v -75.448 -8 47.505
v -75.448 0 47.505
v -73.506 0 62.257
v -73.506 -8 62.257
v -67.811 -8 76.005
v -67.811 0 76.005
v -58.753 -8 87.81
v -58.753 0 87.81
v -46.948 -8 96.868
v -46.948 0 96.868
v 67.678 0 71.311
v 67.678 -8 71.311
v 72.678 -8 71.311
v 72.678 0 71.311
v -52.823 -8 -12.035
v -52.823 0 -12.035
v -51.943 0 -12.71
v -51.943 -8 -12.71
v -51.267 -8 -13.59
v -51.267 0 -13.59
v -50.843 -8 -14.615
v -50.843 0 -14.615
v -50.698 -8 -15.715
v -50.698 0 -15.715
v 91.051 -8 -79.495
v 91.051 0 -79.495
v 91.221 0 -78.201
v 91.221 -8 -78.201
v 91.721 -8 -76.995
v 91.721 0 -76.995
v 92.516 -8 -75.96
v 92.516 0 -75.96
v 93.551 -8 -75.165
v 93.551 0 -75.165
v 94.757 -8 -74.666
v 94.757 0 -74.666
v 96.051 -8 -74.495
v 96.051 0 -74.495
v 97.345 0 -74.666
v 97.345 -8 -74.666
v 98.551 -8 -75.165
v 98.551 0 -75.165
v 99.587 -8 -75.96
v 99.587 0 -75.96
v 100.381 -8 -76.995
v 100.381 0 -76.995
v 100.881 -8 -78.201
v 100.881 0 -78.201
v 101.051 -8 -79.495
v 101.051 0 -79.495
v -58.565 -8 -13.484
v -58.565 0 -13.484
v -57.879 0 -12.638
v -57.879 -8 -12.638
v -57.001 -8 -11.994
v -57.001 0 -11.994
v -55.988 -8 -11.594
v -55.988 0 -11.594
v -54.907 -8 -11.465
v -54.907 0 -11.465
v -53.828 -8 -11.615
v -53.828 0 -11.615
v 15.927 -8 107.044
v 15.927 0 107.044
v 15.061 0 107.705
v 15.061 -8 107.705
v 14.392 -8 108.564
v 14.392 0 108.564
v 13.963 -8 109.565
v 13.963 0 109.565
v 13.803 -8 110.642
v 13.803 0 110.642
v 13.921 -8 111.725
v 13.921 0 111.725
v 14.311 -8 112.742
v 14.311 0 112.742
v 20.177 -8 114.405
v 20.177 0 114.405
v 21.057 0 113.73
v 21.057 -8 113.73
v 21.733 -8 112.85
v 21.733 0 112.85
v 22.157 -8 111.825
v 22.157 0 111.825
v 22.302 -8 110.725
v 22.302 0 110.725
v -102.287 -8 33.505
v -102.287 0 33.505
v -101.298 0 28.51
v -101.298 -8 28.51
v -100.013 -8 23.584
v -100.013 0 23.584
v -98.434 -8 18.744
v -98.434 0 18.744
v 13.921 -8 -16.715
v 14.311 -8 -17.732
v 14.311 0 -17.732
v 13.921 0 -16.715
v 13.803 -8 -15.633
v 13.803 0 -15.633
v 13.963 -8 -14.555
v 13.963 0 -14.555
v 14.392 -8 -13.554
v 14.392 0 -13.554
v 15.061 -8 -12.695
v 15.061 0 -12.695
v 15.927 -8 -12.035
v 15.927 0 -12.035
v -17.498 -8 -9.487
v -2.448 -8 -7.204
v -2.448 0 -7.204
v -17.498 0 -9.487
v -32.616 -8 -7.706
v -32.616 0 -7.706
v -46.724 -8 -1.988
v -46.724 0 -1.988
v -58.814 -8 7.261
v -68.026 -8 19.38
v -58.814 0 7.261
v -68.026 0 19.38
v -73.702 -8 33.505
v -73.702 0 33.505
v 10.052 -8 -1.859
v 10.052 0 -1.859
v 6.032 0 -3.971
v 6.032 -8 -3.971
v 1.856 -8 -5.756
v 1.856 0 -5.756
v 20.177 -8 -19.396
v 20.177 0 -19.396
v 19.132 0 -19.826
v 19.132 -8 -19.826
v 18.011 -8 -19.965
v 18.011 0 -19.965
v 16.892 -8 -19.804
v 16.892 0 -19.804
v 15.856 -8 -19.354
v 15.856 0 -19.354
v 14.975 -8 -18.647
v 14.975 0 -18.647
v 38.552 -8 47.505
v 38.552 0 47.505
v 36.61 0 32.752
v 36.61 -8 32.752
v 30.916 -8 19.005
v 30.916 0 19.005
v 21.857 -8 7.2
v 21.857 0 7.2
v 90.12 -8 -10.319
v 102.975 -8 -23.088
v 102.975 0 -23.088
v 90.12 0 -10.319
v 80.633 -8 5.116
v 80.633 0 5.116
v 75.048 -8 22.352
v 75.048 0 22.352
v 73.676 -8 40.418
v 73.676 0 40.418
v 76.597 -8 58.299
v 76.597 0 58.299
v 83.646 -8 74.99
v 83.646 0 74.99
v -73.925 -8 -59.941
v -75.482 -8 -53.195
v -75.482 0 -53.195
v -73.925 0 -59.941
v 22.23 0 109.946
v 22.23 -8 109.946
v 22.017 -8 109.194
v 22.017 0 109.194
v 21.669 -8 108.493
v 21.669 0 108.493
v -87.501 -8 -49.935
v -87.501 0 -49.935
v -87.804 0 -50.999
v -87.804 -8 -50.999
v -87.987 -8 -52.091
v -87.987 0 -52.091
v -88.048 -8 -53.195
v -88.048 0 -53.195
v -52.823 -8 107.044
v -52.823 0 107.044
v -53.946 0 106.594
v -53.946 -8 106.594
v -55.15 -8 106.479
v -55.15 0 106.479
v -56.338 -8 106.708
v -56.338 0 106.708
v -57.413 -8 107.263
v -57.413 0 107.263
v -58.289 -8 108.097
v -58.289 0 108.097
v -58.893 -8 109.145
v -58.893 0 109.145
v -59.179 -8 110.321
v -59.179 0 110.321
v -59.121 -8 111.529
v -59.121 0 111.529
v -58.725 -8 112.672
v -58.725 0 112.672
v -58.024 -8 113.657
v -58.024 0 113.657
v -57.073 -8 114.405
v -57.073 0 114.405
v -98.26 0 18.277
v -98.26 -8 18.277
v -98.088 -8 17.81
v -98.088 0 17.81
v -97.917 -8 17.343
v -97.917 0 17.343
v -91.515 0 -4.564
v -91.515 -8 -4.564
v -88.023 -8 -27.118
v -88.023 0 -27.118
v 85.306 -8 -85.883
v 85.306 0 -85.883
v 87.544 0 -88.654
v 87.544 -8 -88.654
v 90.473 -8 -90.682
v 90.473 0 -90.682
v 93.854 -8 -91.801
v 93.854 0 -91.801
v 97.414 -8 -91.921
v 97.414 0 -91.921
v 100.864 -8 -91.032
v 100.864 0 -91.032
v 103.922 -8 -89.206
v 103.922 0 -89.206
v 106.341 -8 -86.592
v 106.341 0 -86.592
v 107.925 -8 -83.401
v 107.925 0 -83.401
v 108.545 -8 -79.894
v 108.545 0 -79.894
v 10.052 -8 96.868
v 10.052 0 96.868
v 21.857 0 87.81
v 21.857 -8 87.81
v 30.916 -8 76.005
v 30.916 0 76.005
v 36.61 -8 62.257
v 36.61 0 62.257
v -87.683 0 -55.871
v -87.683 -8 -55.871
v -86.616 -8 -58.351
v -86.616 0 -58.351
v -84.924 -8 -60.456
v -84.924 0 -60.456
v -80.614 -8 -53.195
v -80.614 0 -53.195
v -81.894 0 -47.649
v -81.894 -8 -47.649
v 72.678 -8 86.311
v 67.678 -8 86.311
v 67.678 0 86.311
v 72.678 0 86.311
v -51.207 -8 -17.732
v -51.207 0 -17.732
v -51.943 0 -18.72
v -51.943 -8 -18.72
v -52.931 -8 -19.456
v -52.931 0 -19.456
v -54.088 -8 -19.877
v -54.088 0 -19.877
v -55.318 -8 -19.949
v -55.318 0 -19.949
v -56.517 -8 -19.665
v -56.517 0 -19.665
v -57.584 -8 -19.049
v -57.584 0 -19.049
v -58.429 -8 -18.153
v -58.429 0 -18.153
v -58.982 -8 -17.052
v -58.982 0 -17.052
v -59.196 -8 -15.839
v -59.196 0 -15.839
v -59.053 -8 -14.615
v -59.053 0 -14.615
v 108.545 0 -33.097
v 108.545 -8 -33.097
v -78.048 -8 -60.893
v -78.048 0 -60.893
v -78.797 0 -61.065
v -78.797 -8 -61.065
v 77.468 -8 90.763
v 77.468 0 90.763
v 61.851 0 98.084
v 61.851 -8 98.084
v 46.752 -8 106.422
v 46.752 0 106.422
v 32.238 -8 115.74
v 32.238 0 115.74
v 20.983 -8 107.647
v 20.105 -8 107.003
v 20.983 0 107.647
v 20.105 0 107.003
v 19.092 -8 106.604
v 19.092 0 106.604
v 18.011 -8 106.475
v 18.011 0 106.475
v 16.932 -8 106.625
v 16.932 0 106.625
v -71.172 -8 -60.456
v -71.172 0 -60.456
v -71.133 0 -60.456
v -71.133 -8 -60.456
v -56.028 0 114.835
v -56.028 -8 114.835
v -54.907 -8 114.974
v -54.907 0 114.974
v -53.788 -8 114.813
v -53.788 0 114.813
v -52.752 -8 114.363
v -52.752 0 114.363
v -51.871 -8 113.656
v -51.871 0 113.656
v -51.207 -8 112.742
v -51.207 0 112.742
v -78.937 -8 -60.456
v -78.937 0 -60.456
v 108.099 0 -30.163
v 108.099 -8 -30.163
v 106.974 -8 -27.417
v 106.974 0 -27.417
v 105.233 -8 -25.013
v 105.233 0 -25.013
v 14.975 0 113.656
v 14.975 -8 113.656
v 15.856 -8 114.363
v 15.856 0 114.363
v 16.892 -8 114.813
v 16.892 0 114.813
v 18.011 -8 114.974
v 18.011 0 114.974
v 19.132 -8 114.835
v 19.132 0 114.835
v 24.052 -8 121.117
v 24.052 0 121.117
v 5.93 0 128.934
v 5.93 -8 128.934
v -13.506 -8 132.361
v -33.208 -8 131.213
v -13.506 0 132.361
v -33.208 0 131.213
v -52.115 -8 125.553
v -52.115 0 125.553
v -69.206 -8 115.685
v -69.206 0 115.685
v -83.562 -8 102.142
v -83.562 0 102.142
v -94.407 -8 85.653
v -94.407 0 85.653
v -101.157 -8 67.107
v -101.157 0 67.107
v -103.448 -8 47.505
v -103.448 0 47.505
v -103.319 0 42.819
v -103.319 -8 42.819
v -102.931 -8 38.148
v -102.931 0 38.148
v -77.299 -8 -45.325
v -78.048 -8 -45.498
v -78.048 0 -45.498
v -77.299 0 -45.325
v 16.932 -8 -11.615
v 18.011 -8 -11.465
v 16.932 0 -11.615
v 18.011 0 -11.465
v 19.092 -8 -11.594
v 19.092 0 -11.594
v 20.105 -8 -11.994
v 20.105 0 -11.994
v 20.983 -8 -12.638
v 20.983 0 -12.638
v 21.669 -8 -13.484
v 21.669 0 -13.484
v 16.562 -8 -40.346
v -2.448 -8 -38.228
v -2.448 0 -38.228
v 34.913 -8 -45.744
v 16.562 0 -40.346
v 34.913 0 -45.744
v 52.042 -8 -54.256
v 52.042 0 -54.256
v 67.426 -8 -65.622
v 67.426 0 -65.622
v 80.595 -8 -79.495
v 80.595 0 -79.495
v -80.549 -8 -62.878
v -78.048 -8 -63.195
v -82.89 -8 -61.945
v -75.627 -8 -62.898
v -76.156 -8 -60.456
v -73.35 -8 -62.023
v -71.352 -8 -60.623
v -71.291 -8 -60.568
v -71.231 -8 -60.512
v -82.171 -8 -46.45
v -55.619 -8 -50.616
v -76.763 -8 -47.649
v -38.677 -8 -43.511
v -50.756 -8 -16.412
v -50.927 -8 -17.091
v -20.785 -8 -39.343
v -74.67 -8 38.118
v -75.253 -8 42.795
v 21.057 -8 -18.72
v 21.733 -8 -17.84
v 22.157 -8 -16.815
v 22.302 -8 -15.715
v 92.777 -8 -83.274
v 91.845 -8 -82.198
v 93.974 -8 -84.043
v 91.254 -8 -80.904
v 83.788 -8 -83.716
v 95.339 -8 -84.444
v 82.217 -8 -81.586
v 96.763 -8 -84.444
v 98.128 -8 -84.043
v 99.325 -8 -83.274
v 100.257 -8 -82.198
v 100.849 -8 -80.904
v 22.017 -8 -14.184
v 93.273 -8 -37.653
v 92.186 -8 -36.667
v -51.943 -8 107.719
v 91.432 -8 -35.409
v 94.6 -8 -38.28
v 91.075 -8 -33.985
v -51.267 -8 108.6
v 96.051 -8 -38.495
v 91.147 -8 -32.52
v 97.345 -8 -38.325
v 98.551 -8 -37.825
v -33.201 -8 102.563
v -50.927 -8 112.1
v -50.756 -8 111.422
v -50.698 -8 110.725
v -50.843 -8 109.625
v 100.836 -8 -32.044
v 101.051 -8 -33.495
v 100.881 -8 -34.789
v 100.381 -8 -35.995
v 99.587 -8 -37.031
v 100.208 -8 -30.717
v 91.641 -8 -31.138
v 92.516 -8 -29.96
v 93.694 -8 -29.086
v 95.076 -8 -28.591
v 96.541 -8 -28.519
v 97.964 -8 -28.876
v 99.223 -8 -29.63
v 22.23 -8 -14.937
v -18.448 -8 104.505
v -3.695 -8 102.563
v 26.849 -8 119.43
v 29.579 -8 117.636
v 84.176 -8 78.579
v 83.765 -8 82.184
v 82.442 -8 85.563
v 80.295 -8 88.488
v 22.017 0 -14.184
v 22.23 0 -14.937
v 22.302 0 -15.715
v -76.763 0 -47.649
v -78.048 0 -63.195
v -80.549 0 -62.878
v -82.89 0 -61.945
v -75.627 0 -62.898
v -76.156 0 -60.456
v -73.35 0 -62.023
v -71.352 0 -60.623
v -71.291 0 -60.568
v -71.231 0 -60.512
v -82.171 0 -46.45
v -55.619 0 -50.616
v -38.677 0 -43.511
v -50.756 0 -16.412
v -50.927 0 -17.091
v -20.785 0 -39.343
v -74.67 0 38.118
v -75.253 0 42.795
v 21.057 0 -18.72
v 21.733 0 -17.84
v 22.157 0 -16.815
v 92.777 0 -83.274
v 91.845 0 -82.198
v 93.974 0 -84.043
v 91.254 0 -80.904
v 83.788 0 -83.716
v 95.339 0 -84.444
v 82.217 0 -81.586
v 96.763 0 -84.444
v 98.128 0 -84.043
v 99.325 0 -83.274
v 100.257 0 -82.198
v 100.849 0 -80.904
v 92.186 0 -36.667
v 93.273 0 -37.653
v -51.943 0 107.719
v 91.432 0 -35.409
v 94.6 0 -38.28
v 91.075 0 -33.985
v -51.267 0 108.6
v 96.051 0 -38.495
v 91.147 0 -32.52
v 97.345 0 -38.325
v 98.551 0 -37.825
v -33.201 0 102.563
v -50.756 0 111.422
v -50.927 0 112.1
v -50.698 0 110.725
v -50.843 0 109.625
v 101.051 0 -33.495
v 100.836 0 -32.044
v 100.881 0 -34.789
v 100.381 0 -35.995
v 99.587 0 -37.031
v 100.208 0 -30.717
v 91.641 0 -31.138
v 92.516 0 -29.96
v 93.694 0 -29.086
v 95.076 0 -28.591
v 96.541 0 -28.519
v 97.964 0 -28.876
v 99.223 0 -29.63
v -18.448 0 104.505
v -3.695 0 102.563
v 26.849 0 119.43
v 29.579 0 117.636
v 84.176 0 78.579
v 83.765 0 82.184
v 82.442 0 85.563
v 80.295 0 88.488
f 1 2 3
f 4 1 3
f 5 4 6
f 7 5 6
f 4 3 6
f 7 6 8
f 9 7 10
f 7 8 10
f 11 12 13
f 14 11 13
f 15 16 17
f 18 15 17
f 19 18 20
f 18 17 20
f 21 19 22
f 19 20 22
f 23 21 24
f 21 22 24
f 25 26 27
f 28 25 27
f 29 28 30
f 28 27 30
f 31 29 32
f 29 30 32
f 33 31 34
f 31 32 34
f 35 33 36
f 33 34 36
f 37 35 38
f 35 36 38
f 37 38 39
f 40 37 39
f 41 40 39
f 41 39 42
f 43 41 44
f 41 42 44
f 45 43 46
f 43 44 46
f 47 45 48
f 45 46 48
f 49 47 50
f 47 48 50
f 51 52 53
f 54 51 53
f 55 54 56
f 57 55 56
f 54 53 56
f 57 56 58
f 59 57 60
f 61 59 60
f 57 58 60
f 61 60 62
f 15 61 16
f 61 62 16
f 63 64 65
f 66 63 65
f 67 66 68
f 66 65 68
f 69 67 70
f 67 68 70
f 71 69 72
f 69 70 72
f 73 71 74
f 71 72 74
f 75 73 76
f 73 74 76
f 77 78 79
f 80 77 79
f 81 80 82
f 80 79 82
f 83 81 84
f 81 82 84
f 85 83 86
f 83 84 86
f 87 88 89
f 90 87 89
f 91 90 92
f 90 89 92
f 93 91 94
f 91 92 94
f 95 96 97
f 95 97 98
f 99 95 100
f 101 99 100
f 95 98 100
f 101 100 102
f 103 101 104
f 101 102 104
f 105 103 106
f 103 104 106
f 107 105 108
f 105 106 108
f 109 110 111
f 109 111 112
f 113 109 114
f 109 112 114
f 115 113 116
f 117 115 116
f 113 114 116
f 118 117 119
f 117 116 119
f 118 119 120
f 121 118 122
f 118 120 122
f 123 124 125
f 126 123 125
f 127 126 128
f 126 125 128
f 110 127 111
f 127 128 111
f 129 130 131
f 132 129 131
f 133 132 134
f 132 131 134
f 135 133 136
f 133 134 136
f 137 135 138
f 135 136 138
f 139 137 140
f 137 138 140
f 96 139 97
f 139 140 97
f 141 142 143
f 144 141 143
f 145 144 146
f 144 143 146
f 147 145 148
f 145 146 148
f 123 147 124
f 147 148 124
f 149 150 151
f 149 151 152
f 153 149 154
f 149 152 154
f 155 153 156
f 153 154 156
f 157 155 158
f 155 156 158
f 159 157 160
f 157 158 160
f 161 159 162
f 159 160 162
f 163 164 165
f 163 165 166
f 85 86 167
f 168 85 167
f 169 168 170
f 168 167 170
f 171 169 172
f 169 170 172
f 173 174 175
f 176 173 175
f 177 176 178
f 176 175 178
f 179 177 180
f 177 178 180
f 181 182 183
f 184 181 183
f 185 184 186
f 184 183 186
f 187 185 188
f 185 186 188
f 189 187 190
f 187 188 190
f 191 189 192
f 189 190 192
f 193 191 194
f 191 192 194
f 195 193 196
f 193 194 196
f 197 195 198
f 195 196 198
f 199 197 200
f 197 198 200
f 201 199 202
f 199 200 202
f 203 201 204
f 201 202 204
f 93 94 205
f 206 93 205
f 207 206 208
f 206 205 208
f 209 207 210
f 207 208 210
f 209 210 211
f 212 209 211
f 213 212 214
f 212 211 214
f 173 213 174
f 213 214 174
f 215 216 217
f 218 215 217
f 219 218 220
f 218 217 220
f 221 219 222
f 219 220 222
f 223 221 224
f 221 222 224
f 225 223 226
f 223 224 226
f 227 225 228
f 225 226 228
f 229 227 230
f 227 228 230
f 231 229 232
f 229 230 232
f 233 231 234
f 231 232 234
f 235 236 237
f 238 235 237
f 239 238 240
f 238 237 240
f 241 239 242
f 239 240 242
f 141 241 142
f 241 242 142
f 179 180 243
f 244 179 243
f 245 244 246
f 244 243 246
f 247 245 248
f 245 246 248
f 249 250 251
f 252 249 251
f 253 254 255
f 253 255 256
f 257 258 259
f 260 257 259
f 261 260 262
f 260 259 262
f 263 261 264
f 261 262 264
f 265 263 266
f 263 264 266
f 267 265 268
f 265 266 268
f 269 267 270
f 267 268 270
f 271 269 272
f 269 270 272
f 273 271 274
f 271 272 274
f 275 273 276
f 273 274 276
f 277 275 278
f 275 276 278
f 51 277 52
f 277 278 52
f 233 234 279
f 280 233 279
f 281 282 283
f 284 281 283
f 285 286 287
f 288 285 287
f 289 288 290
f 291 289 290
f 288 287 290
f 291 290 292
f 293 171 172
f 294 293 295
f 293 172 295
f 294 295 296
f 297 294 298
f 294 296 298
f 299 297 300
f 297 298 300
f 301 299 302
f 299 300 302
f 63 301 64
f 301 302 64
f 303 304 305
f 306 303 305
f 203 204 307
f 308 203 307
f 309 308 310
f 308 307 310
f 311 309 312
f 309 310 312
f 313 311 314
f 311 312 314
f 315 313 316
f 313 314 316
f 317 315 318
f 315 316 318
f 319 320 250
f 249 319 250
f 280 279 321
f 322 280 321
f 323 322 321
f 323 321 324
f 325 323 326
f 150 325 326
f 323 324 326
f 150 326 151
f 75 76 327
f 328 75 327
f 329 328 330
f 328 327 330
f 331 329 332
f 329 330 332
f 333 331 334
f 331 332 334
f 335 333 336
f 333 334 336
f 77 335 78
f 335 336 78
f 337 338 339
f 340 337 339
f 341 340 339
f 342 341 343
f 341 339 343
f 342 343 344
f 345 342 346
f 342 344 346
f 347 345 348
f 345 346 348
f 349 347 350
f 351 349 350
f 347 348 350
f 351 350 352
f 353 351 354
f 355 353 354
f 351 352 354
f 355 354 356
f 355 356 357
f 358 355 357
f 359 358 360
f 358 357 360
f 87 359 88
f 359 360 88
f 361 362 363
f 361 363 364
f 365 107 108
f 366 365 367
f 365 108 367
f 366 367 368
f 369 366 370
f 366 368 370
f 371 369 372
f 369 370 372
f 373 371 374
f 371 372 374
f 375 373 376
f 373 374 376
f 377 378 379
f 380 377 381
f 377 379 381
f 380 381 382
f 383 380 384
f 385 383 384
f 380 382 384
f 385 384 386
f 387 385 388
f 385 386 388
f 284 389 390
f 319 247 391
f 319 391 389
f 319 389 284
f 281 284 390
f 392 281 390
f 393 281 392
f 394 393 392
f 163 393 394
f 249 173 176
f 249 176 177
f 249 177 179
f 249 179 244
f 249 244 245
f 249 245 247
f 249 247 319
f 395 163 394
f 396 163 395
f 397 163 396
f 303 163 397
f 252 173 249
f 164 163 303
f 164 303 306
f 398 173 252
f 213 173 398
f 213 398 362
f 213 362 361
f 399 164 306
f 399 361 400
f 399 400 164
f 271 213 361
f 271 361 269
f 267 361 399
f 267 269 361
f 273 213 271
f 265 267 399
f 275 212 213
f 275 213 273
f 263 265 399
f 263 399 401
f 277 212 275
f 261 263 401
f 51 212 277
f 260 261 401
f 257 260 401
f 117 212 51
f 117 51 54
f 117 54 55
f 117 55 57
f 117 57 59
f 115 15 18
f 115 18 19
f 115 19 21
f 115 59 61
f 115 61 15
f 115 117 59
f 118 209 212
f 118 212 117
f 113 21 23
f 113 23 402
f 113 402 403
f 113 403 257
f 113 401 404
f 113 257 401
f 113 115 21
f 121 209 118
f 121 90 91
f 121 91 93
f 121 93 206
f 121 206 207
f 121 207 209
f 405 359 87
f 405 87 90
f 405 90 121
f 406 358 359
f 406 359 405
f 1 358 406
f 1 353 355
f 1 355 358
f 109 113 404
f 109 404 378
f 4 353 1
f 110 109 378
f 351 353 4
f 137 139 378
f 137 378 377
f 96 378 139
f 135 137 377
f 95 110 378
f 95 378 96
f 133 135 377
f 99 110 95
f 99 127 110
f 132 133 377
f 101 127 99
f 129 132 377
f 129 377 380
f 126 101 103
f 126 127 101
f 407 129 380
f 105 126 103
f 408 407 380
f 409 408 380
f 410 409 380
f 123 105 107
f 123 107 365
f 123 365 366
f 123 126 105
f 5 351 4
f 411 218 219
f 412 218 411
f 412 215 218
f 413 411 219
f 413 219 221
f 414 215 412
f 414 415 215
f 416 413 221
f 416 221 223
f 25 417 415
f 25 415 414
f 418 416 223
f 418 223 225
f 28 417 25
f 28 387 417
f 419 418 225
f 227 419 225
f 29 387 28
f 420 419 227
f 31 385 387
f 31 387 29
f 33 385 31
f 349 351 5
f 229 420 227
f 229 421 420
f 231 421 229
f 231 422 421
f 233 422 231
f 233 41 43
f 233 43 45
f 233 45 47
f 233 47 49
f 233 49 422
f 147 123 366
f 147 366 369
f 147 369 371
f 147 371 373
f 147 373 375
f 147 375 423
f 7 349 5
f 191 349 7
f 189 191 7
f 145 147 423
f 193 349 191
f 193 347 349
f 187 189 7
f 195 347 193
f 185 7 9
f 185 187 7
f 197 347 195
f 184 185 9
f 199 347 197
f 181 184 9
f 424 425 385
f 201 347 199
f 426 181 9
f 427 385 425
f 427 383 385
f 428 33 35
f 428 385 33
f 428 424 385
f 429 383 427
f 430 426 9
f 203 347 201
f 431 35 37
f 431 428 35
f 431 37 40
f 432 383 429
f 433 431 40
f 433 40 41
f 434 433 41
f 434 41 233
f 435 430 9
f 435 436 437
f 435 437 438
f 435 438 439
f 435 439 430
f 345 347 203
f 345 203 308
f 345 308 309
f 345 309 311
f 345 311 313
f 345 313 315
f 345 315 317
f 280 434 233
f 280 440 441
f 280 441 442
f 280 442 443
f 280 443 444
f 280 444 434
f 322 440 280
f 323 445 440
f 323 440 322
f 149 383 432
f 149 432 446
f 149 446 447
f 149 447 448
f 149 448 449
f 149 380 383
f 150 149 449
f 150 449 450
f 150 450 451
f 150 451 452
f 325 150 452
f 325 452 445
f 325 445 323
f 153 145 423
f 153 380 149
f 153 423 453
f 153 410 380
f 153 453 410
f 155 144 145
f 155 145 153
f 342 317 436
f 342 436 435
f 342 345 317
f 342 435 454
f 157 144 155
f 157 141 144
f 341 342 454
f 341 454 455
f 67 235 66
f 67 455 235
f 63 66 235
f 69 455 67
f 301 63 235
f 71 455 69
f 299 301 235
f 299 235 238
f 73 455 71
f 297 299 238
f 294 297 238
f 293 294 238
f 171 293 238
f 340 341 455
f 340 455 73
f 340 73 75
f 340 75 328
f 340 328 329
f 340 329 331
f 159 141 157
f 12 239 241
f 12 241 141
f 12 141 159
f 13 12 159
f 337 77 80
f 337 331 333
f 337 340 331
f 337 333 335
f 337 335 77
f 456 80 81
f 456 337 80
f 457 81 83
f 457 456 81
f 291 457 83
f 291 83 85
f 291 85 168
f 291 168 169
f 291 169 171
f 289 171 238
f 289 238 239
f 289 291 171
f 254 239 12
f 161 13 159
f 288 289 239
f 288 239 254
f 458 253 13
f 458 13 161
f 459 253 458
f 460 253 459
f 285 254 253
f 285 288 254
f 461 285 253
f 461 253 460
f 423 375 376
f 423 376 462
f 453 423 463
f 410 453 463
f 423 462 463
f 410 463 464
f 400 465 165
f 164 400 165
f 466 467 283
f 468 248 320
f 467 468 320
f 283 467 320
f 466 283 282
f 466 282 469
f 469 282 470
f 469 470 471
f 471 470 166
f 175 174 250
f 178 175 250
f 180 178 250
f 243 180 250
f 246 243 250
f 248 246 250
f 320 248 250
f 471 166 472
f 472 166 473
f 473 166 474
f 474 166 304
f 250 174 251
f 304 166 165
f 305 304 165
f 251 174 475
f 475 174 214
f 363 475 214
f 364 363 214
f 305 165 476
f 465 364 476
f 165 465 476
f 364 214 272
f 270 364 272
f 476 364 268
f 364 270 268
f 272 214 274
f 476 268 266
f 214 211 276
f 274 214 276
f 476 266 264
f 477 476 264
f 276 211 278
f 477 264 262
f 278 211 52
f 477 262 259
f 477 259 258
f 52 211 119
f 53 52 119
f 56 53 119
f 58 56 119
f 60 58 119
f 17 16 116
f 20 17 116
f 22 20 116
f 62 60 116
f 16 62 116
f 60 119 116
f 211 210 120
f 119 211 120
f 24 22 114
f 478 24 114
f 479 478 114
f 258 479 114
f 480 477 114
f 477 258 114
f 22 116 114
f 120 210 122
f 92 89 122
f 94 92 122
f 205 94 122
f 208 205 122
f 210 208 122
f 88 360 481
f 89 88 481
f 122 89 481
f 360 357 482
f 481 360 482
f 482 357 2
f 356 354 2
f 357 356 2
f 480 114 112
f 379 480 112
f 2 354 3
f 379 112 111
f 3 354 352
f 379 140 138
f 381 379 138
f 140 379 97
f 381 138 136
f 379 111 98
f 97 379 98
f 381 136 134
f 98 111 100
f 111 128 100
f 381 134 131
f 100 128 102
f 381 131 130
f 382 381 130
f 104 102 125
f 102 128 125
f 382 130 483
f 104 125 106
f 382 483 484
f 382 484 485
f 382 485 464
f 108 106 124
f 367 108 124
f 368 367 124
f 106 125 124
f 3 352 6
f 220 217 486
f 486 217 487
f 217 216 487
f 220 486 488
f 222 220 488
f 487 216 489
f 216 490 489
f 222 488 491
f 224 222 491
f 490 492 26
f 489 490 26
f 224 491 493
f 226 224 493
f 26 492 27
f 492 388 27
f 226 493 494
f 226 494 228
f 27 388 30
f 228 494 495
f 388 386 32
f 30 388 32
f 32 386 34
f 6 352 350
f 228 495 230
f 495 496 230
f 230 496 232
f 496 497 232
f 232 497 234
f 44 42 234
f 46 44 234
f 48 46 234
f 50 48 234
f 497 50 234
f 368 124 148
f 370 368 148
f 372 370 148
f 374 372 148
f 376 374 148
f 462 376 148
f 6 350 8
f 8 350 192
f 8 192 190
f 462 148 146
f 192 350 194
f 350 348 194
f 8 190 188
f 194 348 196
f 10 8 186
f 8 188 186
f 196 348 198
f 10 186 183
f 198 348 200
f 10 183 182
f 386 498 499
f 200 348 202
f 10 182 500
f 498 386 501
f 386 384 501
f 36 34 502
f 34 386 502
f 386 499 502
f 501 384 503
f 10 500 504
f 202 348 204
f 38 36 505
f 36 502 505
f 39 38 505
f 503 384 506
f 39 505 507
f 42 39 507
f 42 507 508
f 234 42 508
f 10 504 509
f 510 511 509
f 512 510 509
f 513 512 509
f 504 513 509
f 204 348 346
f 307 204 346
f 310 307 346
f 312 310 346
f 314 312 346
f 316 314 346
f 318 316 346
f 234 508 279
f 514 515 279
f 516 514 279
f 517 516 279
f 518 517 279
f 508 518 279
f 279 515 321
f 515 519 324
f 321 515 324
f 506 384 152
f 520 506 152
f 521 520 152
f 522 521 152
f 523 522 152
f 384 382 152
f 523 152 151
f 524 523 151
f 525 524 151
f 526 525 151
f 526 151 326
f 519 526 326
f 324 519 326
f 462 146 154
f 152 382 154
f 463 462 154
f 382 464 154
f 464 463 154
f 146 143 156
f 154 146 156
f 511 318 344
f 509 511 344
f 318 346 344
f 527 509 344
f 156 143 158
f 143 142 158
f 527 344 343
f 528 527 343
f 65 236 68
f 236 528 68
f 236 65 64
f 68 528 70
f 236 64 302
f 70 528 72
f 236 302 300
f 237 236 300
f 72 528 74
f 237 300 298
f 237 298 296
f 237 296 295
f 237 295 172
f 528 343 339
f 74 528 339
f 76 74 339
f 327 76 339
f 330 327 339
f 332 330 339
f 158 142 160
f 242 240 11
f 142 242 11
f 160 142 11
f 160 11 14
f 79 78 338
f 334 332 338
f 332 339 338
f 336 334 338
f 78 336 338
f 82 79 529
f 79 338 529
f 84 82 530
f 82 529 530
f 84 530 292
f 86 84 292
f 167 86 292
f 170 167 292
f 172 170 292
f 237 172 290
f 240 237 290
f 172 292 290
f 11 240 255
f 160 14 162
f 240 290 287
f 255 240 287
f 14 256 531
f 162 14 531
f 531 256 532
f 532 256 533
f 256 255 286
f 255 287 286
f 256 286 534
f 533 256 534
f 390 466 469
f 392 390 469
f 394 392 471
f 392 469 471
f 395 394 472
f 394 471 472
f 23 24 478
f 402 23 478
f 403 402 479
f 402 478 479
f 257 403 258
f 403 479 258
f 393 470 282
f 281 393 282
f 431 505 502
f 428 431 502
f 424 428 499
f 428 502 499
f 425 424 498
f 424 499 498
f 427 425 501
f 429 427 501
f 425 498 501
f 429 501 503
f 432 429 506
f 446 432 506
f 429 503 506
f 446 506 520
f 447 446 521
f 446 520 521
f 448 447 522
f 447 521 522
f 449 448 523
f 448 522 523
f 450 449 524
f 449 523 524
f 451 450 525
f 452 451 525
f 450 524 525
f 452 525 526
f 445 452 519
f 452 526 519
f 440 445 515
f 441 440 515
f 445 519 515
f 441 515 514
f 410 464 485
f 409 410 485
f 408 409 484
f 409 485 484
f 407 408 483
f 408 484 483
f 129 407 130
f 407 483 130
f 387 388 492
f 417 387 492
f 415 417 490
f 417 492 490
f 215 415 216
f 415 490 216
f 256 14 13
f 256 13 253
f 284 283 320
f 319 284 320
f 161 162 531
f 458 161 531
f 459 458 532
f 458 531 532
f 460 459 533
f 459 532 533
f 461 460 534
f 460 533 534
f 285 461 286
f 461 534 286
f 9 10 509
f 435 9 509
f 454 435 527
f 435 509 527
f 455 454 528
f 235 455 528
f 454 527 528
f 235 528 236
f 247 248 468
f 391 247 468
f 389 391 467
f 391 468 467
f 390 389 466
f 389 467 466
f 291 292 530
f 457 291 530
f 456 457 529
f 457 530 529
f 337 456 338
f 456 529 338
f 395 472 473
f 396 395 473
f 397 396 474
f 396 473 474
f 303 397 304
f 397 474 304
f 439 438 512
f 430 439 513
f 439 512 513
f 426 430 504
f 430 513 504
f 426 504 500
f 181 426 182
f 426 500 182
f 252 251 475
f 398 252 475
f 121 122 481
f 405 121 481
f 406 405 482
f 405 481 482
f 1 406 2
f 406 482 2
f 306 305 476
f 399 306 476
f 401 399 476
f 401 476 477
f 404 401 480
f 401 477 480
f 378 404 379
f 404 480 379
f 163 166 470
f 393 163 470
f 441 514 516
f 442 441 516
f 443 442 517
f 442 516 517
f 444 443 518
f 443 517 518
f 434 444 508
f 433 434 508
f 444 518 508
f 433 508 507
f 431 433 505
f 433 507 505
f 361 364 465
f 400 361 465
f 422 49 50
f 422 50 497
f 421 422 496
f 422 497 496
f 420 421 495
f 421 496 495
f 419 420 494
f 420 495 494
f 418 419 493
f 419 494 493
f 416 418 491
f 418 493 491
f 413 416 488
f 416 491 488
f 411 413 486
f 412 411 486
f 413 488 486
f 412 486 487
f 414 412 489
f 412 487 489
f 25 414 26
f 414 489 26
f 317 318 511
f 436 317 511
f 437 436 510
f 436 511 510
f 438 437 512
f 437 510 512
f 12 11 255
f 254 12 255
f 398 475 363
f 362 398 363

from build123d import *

# Parameters (mm, degrees)
F0_W     = 5
F0_H     = 15
F1_DEPTH = 8


with BuildPart() as f1:
    # F0 (on Front) → F1 (new body)
    with BuildSketch(Plane.XZ):
        with BuildLine():
            ThreePointArc((96.051040545, -74.4952633909), (99.586574451, -75.9597294849), (101.051040545, -79.4952633909))
            Line((101.051040545, -79.4952633909), (108.5446846503, -79.4952633909))
            Line((108.5446846503, -79.4952633909), (108.5446846503, -79.0966947381))
            Line((108.5446846503, -79.0966947381), (108.5446846503, -33.8938320436))
            Line((108.5446846503, -33.8938320436), (108.5446846503, -33.0966947381))
            ThreePointArc((108.5446846503, -33.0966947381), (106.9735378091, -27.4166900782), (102.9745588744, -23.0878192309))
            ThreePointArc((102.9745588744, -23.0878192309), (75.0475031004, 22.3518348869), (83.6459918624, 74.9897356957))
            ThreePointArc((83.6459918624, 74.9897356957), (83.213349074, 83.916829816), (77.4679593625, 90.763046748))
            ThreePointArc((77.4679593625, 90.763046748), (54.2323791008, 102.1278384031), (32.237536797, 115.739509553))
            ThreePointArc((32.237536797, 115.739509553), (46.3985337021, 102.4586914011), (57.1766192186, 86.3110340872))
            ThreePointArc((57.1766192186, 86.3110340872), (64.1749741493, 67.4661239993), (66.5520777255, 47.5047366091))
            ThreePointArc((66.5520777255, 47.5047366091), (55.1642370471, 5.0047366091), (24.0520777255, -26.1074227125))
            ThreePointArc((24.0520777255, -26.1074227125), (11.2153330726, -32.151344654), (-2.4479222745, -35.9758000446))
            Line((-2.4479222745, -35.9758000446), (-2.4479222745, -38.2282986652))
            ThreePointArc((-2.4479222745, -38.2282986652), (43.6638893075, -49.6244865639), (80.5950273587, -79.4952633909))
            Line((80.5950273587, -79.4952633909), (91.051040545, -79.4952633909))
            ThreePointArc((91.051040545, -79.4952633909), (92.5155066391, -75.9597294849), (96.051040545, -74.4952633909))
        make_face()
        with BuildLine():
            ThreePointArc((101.051040545, -33.4952633909), (99.586574451, -37.0307972968), (96.051040545, -38.4952633909))
            ThreePointArc((96.051040545, -38.4952633909), (92.5155066391, -29.9597294849), (101.051040545, -33.4952633909))
        make_face(mode=Mode.SUBTRACT)
        with Locations((70.1775963157, 78.8110340872)):
            Rectangle(F0_W, F0_H, mode=Mode.SUBTRACT)
        with BuildLine():
            Line((108.5446846503, -79.4952633909), (101.051040545, -79.4952633909))
            ThreePointArc((101.051040545, -79.4952633909), (96.051040545, -84.4952633909), (91.051040545, -79.4952633909))
            Line((91.051040545, -79.4952633909), (80.5950273587, -79.4952633909))
            ThreePointArc((80.5950273587, -79.4952633909), (83.0087277773, -82.6464275943), (85.3064858893, -85.8831069432))
            ThreePointArc((85.3064858893, -85.8831069432), (99.1707652013, -91.5996972095), (108.5446846503, -79.8938320436))
            Line((108.5446846503, -79.8938320436), (108.5446846503, -79.4952633909))
        make_face()
        with BuildLine():
            ThreePointArc((-49.4766412308, -47.648732709), (-26.485075504, -40.328623161), (-2.4479222745, -38.2282986652))
            Line((-2.4479222745, -38.2282986652), (-2.4479222745, -35.9758000446))
            ThreePointArc((-2.4479222745, -35.9758000446), (-59.8941418394, -26.7058481061), (-97.9165682257, 17.3429344301))
            ThreePointArc((-97.9165682257, 17.3429344301), (-89.4001229489, -15.7837478144), (-87.5014994409, -49.9349139067))
            ThreePointArc((-87.5014994409, -49.9349139067), (-87.0083312551, -48.7555482085), (-86.3687393855, -47.648732709))
            ThreePointArc((-86.3687393855, -47.648732709), (-82.7667512172, -44.3786510364), (-78.0479222745, -43.1952633909))
            Line((-78.0479222745, -43.1952633909), (-78.0479222745, -42.0817346844))
            Line((-78.0479222745, -42.0817346844), (-77.7900763305, -43.1985881701))
            ThreePointArc((-77.7900763305, -43.1985881701), (-73.2158097389, -44.4402255016), (-69.7271051635, -47.648732709))
            Line((-69.7271051635, -47.648732709), (-49.4766412308, -47.648732709))
        make_face()
        with BuildLine():
            ThreePointArc((-97.9165682257, 17.3429344301), (-59.8941418394, -26.7058481061), (-2.4479222745, -35.9758000446))
            Line((-2.4479222745, -35.9758000446), (-2.4479222745, -23.7202590034))
            ThreePointArc((-2.4479222745, -23.7202590034), (-27.346314823, -24.9508954014), (-51.2070161773, -17.7320763623))
            ThreePointArc((-51.2070161773, -17.7320763623), (-57.0729222745, -19.3957258332), (-58.5651126184, -13.4838774013))
            ThreePointArc((-58.5651126184, -13.4838774013), (-79.0670356762, 6.8313658317), (-90.0928802269, 33.5047366091))
            Line((-90.0928802269, 33.5047366091), (-102.2870539494, 33.5047366091))
            ThreePointArc((-102.2870539494, 33.5047366091), (-100.6924729992, 26.0376949849), (-98.4342508199, 18.7438735165))
            ThreePointArc((-98.4342508199, 18.7438735165), (-98.1739124224, 18.0439571899), (-97.9165682257, 17.3429344301))
        make_face()
        with BuildLine():
            Line((-2.4479222745, -23.7202590034), (-2.4479222745, -35.9758000446))
            ThreePointArc((-2.4479222745, -35.9758000446), (11.2153330726, -32.151344654), (24.0520777255, -26.1074227125))
            Line((24.0520777255, -26.1074227125), (20.1770777255, -19.3957258332))
            ThreePointArc((20.1770777255, -19.3957258332), (16.8924568739, -19.8038559953), (14.3111716282, -17.7320763623))
            ThreePointArc((14.3111716282, -17.7320763623), (6.1147911828, -21.2387947783), (-2.4479222745, -23.7202590034))
        make_face()
        with BuildLine():
            ThreePointArc((-71.1328973462, -60.4558025605), (-60.6742880355, -53.4274258311), (-49.4766412308, -47.648732709))
            Line((-49.4766412308, -47.648732709), (-69.7271051635, -47.648732709))
            ThreePointArc((-69.7271051635, -47.648732709), (-68.4769199469, -50.2976929525), (-68.0479222745, -53.1952633909))
            ThreePointArc((-68.0479222745, -53.1952633909), (-68.8619607706, -57.1472390041), (-71.1715445241, -60.4558025605))
            Line((-71.1715445241, -60.4558025605), (-71.1328973462, -60.4558025605))
        make_face()
        with BuildLine():
            ThreePointArc((-51.2070161773, -17.7320763623), (-27.346314823, -24.9508954014), (-2.4479222745, -23.7202590034))
            Line((-2.4479222745, -23.7202590034), (-2.4479222745, -7.2035808572))
            ThreePointArc((-2.4479222745, -7.2035808572), (-25.2453046649, -9.0885102728), (-46.9479222745, -1.8587114066))
            Line((-46.9479222745, -1.8587114066), (-52.8229222745, -12.034509901))
            ThreePointArc((-52.8229222745, -12.034509901), (-51.2673143085, -13.5901178671), (-50.6979222745, -15.7151178671))
            ThreePointArc((-50.6979222745, -15.7151178671), (-50.8271607604, -16.755225815), (-51.2070161773, -17.7320763623))
        make_face()
        with BuildLine():
            Line((-2.4479222745, -7.2035808572), (-2.4479222745, -23.7202590034))
            ThreePointArc((-2.4479222745, -23.7202590034), (6.1147911828, -21.2387947783), (14.3111716282, -17.7320763623))
            ThreePointArc((14.3111716282, -17.7320763623), (13.9633395973, -14.5554970156), (15.9270777255, -12.034509901))
            Line((15.9270777255, -12.034509901), (10.0520777255, -1.8587114066))
            ThreePointArc((10.0520777255, -1.8587114066), (3.9619953371, -4.9051440684), (-2.4479222745, -7.2035808572))
        make_face()
        with BuildLine():
            Line((20.1770777255, -19.3957258332), (24.0520777255, -26.1074227125))
            ThreePointArc((24.0520777255, -26.1074227125), (55.1642370471, 5.0047366091), (66.5520777255, 47.5047366091))
            ThreePointArc((66.5520777255, 47.5047366091), (64.1749741493, 67.4661239993), (57.1766192186, 86.3110340872))
            ThreePointArc((57.1766192186, 86.3110340872), (46.3985337021, 102.4586914011), (32.237536797, 115.739509553))
            ThreePointArc((32.237536797, 115.739509553), (28.2223200289, 118.5461926988), (24.0520777255, 121.1168959308))
            Line((24.0520777255, 121.1168959308), (20.1770777255, 114.4051990515))
            ThreePointArc((20.1770777255, 114.4051990515), (21.7326856915, 112.8495910854), (22.3020777255, 110.7245910854))
            ThreePointArc((22.3020777255, 110.7245910854), (22.1408158536, 109.5649702339), (21.6692680693, 108.4933506196))
            ThreePointArc((21.6692680693, 108.4933506196), (45.8076412788, 82.1489648795), (54.5520777255, 47.5047366091))
            ThreePointArc((54.5520777255, 47.5047366091), (45.8076412788, 12.8605083388), (21.6692680693, -13.4838774013))
            ThreePointArc((21.6692680693, -13.4838774013), (22.1408158536, -14.5554970156), (22.3020777255, -15.7151178671))
            ThreePointArc((22.3020777255, -15.7151178671), (21.7326856915, -17.8401178671), (20.1770777255, -19.3957258332))
        make_face()
        with BuildLine():
            ThreePointArc((-68.0479222745, -53.1952633909), (-68.4769199469, -50.2976929525), (-69.7271051635, -47.648732709))
            Line((-69.7271051635, -47.648732709), (-76.7626795106, -47.648732709))
            Line((-76.7626795106, -47.648732709), (-75.4821620051, -53.1952633909))
            Line((-75.4821620051, -53.1952633909), (-73.924864205, -59.9406612409))
            Line((-73.924864205, -59.9406612409), (-73.8059344604, -60.4558025605))
            Line((-73.8059344604, -60.4558025605), (-71.1715445241, -60.4558025605))
            ThreePointArc((-71.1715445241, -60.4558025605), (-68.8619607706, -57.1472390041), (-68.0479222745, -53.1952633909))
        make_face()
        with BuildLine():
            Line((-76.7626795106, -47.648732709), (-69.7271051635, -47.648732709))
            ThreePointArc((-69.7271051635, -47.648732709), (-73.2158097389, -44.4402255016), (-77.7900763305, -43.1985881701))
            Line((-77.7900763305, -43.1985881701), (-77.2991300202, -45.3251102691))
            Line((-77.2991300202, -45.3251102691), (-76.7626795106, -47.648732709))
        make_face()
        with BuildLine():
            ThreePointArc((-86.3687393855, -47.648732709), (-87.0083312551, -48.7555482085), (-87.5014994409, -49.9349139067))
            ThreePointArc((-87.5014994409, -49.9349139067), (-87.9103705422, -51.5423525741), (-88.0479222745, -53.1952633909))
            Line((-88.0479222745, -53.1952633909), (-80.613682544, -53.1952633909))
            Line((-80.613682544, -53.1952633909), (-81.8942000496, -47.648732709))
            Line((-81.8942000496, -47.648732709), (-86.3687393855, -47.648732709))
        make_face()
        with BuildLine():
            ThreePointArc((-71.3521437188, -60.6226821573), (-71.2613311641, -60.5397974877), (-71.1715445241, -60.4558025605))
            Line((-71.1715445241, -60.4558025605), (-73.8059344604, -60.4558025605))
            Line((-73.8059344604, -60.4558025605), (-76.1561864026, -60.4558025605))
            Line((-76.1561864026, -60.4558025605), (-78.0479222745, -60.8925441993))
            Line((-78.0479222745, -60.8925441993), (-78.0479222745, -63.1952633909))
            ThreePointArc((-78.0479222745, -63.1952633909), (-74.4614328813, -62.5299885519), (-71.3521437188, -60.6226821573))
        make_face()
        with BuildLine():
            ThreePointArc((-78.0479222745, -43.1952633909), (-77.9189885852, -43.1960946202), (-77.7900763305, -43.1985881701))
            Line((-77.7900763305, -43.1985881701), (-78.0479222745, -42.0817346844))
            Line((-78.0479222745, -42.0817346844), (-78.0479222745, -43.1952633909))
        make_face()
        with BuildLine():
            Line((-77.2991300202, -45.3251102691), (-77.7900763305, -43.1985881701))
            ThreePointArc((-77.7900763305, -43.1985881701), (-77.9189885852, -43.1960946202), (-78.0479222745, -43.1952633909))
            Line((-78.0479222745, -43.1952633909), (-78.0479222745, -45.4979825824))
            Line((-78.0479222745, -45.4979825824), (-77.2991300202, -45.3251102691))
        make_face()
        with BuildLine():
            Line((-52.8229222745, -12.034509901), (-46.9479222745, -1.8587114066))
            ThreePointArc((-46.9479222745, -1.8587114066), (-63.9047675407, 13.1146912697), (-73.7018814087, 33.5047366091))
            Line((-73.7018814087, 33.5047366091), (-90.0928802269, 33.5047366091))
            ThreePointArc((-90.0928802269, 33.5047366091), (-79.0670356762, 6.8313658317), (-58.5651126184, -13.4838774013))
            ThreePointArc((-58.5651126184, -13.4838774013), (-55.9880302224, -11.5943563529), (-52.8229222745, -12.034509901))
        make_face()
        with BuildLine():
            ThreePointArc((38.5520777255, 47.5047366091), (30.9155257412, 19.0047366091), (10.0520777255, -1.8587114066))
            Line((10.0520777255, -1.8587114066), (15.9270777255, -12.034509901))
            ThreePointArc((15.9270777255, -12.034509901), (19.0921856734, -11.5943563529), (21.6692680693, -13.4838774013))
            ThreePointArc((21.6692680693, -13.4838774013), (45.8076412788, 12.8605083388), (54.5520777255, 47.5047366091))
            ThreePointArc((54.5520777255, 47.5047366091), (45.8076412788, 82.1489648795), (21.6692680693, 108.4933506196))
            ThreePointArc((21.6692680693, 108.4933506196), (19.0921856734, 106.6038295712), (15.9270777255, 107.0439831193))
            Line((15.9270777255, 107.0439831193), (10.0520777255, 96.8681846249))
            ThreePointArc((10.0520777255, 96.8681846249), (30.9155257412, 76.0047366091), (38.5520777255, 47.5047366091))
        make_face()
        with BuildLine():
            ThreePointArc((-103.4479222745, 47.5047366091), (-103.1572080476, 40.4807132737), (-102.2870539494, 33.5047366091))
            Line((-102.2870539494, 33.5047366091), (-90.0928802269, 33.5047366091))
            ThreePointArc((-90.0928802269, 33.5047366091), (-91.1083720754, 40.4720248464), (-91.4479222745, 47.5047366091))
            Line((-91.4479222745, 47.5047366091), (-103.4479222745, 47.5047366091))
        make_face()
        with BuildLine():
            ThreePointArc((-78.0479222745, -43.1952633909), (-82.7667512172, -44.3786510364), (-86.3687393855, -47.648732709))
            Line((-86.3687393855, -47.648732709), (-81.8942000496, -47.648732709))
            Line((-81.8942000496, -47.648732709), (-82.1709803441, -46.4498655408))
            Line((-82.1709803441, -46.4498655408), (-78.0479222745, -45.4979825824))
            Line((-78.0479222745, -45.4979825824), (-78.0479222745, -43.1952633909))
        make_face()
        with BuildLine():
            Line((-80.613682544, -53.1952633909), (-88.0479222745, -53.1952633909))
            ThreePointArc((-88.0479222745, -53.1952633909), (-87.2338837785, -57.1472390041), (-84.924300025, -60.4558025605))
            Line((-84.924300025, -60.4558025605), (-78.9374549993, -60.4558025605))
            Line((-78.9374549993, -60.4558025605), (-80.613682544, -53.1952633909))
        make_face()
        Polygon((-76.1561864026, -60.4558025605), (-73.8059344604, -60.4558025605), (-73.924864205, -59.9406612409), align=None)
        with BuildLine():
            ThreePointArc((-84.924300025, -60.4558025605), (-81.7489091905, -62.4851878172), (-78.0479222745, -63.1952633909))
            Line((-78.0479222745, -63.1952633909), (-78.0479222745, -60.8925441993))
            Line((-78.0479222745, -60.8925441993), (-78.7967145289, -61.0654165126))
            Line((-78.7967145289, -61.0654165126), (-78.9374549993, -60.4558025605))
            Line((-78.9374549993, -60.4558025605), (-84.924300025, -60.4558025605))
        make_face()
        with BuildLine():
            Line((-90.0928802269, 33.5047366091), (-73.7018814087, 33.5047366091))
            ThreePointArc((-73.7018814087, 33.5047366091), (-75.0097277206, 40.450506341), (-75.4479222745, 47.5047366091))
            Line((-75.4479222745, 47.5047366091), (-91.4479222745, 47.5047366091))
            ThreePointArc((-91.4479222745, 47.5047366091), (-91.1083720754, 40.4720248464), (-90.0928802269, 33.5047366091))
        make_face()
        with BuildLine():
            ThreePointArc((-60.9479222745, 121.1168959308), (-92.0600815962, 90.0047366091), (-103.4479222745, 47.5047366091))
            Line((-103.4479222745, 47.5047366091), (-91.4479222745, 47.5047366091))
            ThreePointArc((-91.4479222745, 47.5047366091), (-82.7034858278, 82.1489648795), (-58.5651126184, 108.4933506196))
            ThreePointArc((-58.5651126184, 108.4933506196), (-59.0686837887, 111.7646990333), (-57.0729222745, 114.4051990515))
            Line((-57.0729222745, 114.4051990515), (-60.9479222745, 121.1168959308))
        make_face()
        with BuildLine():
            Line((-91.4479222745, 47.5047366091), (-75.4479222745, 47.5047366091))
            ThreePointArc((-75.4479222745, 47.5047366091), (-67.8113702903, 76.0047366091), (-46.9479222745, 96.8681846249))
            Line((-46.9479222745, 96.8681846249), (-52.8229222745, 107.0439831193))
            ThreePointArc((-52.8229222745, 107.0439831193), (-55.9880302224, 106.6038295712), (-58.5651126184, 108.4933506196))
            ThreePointArc((-58.5651126184, 108.4933506196), (-82.7034858278, 82.1489648795), (-91.4479222745, 47.5047366091))
        make_face()
        with BuildLine():
            ThreePointArc((-46.9479222745, 96.8681846249), (-18.4479222745, 104.5047366091), (10.0520777255, 96.8681846249))
            Line((10.0520777255, 96.8681846249), (15.9270777255, 107.0439831193))
            ThreePointArc((15.9270777255, 107.0439831193), (13.9633395973, 109.5649702339), (14.3111716282, 112.7415495806))
            ThreePointArc((14.3111716282, 112.7415495806), (-18.4479222745, 120.5047366091), (-51.2070161773, 112.7415495806))
            ThreePointArc((-51.2070161773, 112.7415495806), (-50.8271607604, 111.7646990333), (-50.6979222745, 110.7245910854))
            ThreePointArc((-50.6979222745, 110.7245910854), (-51.2673143085, 108.5995910854), (-52.8229222745, 107.0439831193))
            Line((-52.8229222745, 107.0439831193), (-46.9479222745, 96.8681846249))
        make_face()
        with BuildLine():
            ThreePointArc((24.0520777255, 121.1168959308), (-18.4479222745, 132.5047366091), (-60.9479222745, 121.1168959308))
            Line((-60.9479222745, 121.1168959308), (-57.0729222745, 114.4051990515))
            ThreePointArc((-57.0729222745, 114.4051990515), (-53.788301423, 114.8133292136), (-51.2070161773, 112.7415495806))
            ThreePointArc((-51.2070161773, 112.7415495806), (-18.4479222745, 120.5047366091), (14.3111716282, 112.7415495806))
            ThreePointArc((14.3111716282, 112.7415495806), (16.8924568739, 114.8133292136), (20.1770777255, 114.4051990515))
            Line((20.1770777255, 114.4051990515), (24.0520777255, 121.1168959308))
        make_face()
    extrude(amount=F1_DEPTH)


solid = f1.part
